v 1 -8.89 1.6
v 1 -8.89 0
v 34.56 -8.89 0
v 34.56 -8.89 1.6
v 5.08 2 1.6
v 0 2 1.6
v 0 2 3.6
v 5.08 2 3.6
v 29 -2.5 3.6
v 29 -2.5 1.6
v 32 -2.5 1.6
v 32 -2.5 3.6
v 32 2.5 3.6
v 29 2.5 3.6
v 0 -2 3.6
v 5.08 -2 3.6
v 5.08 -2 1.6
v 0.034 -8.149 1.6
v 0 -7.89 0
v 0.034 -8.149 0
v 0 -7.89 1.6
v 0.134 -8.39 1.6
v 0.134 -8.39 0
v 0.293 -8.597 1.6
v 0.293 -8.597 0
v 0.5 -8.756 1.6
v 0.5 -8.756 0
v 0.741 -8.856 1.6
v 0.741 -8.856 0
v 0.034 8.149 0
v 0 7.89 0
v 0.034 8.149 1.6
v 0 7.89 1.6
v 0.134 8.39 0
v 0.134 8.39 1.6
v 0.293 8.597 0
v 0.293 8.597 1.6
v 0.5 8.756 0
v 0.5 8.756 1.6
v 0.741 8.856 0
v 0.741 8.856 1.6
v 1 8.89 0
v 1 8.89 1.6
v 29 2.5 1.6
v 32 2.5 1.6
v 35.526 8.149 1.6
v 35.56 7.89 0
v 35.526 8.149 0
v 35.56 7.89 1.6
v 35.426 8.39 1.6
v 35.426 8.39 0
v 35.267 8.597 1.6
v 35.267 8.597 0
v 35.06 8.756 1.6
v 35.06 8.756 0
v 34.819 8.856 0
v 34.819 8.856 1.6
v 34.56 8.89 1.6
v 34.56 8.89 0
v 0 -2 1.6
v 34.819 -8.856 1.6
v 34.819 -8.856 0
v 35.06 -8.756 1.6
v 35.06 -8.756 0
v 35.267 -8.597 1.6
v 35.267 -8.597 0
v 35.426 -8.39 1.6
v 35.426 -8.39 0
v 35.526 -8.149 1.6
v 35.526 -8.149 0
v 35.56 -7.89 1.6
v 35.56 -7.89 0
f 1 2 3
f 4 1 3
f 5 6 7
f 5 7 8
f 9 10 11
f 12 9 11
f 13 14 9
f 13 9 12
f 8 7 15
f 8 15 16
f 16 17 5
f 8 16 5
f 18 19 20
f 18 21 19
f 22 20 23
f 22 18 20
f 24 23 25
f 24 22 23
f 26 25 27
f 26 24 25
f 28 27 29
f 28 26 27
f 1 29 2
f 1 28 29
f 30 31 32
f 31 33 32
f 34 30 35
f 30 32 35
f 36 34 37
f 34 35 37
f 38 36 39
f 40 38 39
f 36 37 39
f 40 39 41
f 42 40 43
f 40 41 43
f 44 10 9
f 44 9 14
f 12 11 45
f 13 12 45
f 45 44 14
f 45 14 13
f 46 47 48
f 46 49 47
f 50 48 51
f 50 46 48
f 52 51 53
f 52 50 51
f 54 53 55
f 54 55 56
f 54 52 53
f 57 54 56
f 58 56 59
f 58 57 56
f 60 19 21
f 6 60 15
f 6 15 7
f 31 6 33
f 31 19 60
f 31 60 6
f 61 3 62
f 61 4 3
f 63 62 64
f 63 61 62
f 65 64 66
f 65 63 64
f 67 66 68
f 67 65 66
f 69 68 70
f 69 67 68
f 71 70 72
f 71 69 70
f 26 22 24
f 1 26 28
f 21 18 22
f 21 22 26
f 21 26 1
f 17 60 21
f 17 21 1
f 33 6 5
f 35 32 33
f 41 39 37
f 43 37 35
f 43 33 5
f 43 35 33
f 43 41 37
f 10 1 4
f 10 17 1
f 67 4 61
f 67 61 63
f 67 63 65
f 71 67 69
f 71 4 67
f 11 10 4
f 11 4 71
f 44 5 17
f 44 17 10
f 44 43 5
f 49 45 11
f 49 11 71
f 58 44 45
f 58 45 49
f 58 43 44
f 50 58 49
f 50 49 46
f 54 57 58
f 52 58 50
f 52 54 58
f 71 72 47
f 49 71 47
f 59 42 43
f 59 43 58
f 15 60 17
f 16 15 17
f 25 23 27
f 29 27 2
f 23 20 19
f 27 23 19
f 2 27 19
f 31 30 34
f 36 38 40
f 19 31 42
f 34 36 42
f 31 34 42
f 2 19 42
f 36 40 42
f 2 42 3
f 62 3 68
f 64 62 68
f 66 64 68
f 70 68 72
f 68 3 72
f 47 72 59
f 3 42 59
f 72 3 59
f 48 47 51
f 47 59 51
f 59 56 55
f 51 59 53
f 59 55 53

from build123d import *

# Parameters (mm, degrees)
SKETCH_W      = 35.56
SKETCH_H      = 17.78
PAD_DEPTH     = 1.6
FILLET_R      = 1
SKETCH001_W   = 5.08
SKETCH001_H   = 4
SKETCH001_W_2 = 3
SKETCH001_H_2 = 5
PAD001_DEPTH  = 2


with BuildPart() as part:
    # Sketch → Pad (new body)
    with BuildSketch(Plane.XY):
        with Locations((17.78, 0)):
            Rectangle(SKETCH_W, SKETCH_H)
    extrude(amount=PAD_DEPTH)

    # Fillet
    fillet_edges = [part.edges().sort_by_distance(p)[0] for p in [
        (0, -8.89, 0.8),
        (0, 8.89, 0.8),
        (35.56, -8.89, 0.8),
        (35.56, 8.89, 0.8),
    ]]
    fillet(fillet_edges, radius=FILLET_R)

    # Sketch001 (on Face5 of Fillet) → Pad001 (join)
    with BuildSketch(Plane.XY.offset(1.6)):
        with Locations((2.54, 0)):
            Rectangle(SKETCH001_W, SKETCH001_H)
        with Locations((30.5, 0)):
            Rectangle(SKETCH001_W_2, SKETCH001_H_2)
    extrude(amount=PAD001_DEPTH)


solid = part.part
